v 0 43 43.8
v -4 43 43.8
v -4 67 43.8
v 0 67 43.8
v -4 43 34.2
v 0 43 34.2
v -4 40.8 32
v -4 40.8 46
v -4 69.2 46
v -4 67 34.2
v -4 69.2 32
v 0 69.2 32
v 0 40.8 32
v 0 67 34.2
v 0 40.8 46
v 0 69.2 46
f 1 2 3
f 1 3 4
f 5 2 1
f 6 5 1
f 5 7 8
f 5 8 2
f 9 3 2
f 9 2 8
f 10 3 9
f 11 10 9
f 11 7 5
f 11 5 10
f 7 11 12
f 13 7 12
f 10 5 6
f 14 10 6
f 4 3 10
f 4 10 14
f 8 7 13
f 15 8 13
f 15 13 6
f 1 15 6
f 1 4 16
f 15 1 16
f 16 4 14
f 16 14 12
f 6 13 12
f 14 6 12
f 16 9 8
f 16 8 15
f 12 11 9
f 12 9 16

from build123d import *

# Parameters (mm, degrees)
BOX058_W     = 4
BOX058_H     = 24
BOX058_DEPTH = 9.6
BOX057_W     = 4
BOX057_H     = 28.4
BOX057_DEPTH = 14


with BuildPart() as cube050:
    # Box058 → Box058 (new body)
    with BuildSketch(Plane(origin=(0, 2.2, 2.2), x_dir=(1, 0, 0), z_dir=(0, 0, 1))):
        with Locations((2, 12)):
            Rectangle(BOX058_W, BOX058_H)
    extrude(amount=BOX058_DEPTH)


with BuildPart() as ruecken_rohr:
    # Box057 → Box057 (new body)
    with BuildSketch(Plane.XY):
        with Locations((2, 14.2)):
            Rectangle(BOX057_W, BOX057_H)
    extrude(amount=BOX057_DEPTH)

    # Cut053: cut Cube050
    add(cube050.part, mode=Mode.SUBTRACT)


with BuildPart() as ruecken_rohr_1:
    # Cut053 placement: moved
    add(ruecken_rohr.part.moved(Location((-4, 40.8, 32))))


solid = ruecken_rohr_1.part
